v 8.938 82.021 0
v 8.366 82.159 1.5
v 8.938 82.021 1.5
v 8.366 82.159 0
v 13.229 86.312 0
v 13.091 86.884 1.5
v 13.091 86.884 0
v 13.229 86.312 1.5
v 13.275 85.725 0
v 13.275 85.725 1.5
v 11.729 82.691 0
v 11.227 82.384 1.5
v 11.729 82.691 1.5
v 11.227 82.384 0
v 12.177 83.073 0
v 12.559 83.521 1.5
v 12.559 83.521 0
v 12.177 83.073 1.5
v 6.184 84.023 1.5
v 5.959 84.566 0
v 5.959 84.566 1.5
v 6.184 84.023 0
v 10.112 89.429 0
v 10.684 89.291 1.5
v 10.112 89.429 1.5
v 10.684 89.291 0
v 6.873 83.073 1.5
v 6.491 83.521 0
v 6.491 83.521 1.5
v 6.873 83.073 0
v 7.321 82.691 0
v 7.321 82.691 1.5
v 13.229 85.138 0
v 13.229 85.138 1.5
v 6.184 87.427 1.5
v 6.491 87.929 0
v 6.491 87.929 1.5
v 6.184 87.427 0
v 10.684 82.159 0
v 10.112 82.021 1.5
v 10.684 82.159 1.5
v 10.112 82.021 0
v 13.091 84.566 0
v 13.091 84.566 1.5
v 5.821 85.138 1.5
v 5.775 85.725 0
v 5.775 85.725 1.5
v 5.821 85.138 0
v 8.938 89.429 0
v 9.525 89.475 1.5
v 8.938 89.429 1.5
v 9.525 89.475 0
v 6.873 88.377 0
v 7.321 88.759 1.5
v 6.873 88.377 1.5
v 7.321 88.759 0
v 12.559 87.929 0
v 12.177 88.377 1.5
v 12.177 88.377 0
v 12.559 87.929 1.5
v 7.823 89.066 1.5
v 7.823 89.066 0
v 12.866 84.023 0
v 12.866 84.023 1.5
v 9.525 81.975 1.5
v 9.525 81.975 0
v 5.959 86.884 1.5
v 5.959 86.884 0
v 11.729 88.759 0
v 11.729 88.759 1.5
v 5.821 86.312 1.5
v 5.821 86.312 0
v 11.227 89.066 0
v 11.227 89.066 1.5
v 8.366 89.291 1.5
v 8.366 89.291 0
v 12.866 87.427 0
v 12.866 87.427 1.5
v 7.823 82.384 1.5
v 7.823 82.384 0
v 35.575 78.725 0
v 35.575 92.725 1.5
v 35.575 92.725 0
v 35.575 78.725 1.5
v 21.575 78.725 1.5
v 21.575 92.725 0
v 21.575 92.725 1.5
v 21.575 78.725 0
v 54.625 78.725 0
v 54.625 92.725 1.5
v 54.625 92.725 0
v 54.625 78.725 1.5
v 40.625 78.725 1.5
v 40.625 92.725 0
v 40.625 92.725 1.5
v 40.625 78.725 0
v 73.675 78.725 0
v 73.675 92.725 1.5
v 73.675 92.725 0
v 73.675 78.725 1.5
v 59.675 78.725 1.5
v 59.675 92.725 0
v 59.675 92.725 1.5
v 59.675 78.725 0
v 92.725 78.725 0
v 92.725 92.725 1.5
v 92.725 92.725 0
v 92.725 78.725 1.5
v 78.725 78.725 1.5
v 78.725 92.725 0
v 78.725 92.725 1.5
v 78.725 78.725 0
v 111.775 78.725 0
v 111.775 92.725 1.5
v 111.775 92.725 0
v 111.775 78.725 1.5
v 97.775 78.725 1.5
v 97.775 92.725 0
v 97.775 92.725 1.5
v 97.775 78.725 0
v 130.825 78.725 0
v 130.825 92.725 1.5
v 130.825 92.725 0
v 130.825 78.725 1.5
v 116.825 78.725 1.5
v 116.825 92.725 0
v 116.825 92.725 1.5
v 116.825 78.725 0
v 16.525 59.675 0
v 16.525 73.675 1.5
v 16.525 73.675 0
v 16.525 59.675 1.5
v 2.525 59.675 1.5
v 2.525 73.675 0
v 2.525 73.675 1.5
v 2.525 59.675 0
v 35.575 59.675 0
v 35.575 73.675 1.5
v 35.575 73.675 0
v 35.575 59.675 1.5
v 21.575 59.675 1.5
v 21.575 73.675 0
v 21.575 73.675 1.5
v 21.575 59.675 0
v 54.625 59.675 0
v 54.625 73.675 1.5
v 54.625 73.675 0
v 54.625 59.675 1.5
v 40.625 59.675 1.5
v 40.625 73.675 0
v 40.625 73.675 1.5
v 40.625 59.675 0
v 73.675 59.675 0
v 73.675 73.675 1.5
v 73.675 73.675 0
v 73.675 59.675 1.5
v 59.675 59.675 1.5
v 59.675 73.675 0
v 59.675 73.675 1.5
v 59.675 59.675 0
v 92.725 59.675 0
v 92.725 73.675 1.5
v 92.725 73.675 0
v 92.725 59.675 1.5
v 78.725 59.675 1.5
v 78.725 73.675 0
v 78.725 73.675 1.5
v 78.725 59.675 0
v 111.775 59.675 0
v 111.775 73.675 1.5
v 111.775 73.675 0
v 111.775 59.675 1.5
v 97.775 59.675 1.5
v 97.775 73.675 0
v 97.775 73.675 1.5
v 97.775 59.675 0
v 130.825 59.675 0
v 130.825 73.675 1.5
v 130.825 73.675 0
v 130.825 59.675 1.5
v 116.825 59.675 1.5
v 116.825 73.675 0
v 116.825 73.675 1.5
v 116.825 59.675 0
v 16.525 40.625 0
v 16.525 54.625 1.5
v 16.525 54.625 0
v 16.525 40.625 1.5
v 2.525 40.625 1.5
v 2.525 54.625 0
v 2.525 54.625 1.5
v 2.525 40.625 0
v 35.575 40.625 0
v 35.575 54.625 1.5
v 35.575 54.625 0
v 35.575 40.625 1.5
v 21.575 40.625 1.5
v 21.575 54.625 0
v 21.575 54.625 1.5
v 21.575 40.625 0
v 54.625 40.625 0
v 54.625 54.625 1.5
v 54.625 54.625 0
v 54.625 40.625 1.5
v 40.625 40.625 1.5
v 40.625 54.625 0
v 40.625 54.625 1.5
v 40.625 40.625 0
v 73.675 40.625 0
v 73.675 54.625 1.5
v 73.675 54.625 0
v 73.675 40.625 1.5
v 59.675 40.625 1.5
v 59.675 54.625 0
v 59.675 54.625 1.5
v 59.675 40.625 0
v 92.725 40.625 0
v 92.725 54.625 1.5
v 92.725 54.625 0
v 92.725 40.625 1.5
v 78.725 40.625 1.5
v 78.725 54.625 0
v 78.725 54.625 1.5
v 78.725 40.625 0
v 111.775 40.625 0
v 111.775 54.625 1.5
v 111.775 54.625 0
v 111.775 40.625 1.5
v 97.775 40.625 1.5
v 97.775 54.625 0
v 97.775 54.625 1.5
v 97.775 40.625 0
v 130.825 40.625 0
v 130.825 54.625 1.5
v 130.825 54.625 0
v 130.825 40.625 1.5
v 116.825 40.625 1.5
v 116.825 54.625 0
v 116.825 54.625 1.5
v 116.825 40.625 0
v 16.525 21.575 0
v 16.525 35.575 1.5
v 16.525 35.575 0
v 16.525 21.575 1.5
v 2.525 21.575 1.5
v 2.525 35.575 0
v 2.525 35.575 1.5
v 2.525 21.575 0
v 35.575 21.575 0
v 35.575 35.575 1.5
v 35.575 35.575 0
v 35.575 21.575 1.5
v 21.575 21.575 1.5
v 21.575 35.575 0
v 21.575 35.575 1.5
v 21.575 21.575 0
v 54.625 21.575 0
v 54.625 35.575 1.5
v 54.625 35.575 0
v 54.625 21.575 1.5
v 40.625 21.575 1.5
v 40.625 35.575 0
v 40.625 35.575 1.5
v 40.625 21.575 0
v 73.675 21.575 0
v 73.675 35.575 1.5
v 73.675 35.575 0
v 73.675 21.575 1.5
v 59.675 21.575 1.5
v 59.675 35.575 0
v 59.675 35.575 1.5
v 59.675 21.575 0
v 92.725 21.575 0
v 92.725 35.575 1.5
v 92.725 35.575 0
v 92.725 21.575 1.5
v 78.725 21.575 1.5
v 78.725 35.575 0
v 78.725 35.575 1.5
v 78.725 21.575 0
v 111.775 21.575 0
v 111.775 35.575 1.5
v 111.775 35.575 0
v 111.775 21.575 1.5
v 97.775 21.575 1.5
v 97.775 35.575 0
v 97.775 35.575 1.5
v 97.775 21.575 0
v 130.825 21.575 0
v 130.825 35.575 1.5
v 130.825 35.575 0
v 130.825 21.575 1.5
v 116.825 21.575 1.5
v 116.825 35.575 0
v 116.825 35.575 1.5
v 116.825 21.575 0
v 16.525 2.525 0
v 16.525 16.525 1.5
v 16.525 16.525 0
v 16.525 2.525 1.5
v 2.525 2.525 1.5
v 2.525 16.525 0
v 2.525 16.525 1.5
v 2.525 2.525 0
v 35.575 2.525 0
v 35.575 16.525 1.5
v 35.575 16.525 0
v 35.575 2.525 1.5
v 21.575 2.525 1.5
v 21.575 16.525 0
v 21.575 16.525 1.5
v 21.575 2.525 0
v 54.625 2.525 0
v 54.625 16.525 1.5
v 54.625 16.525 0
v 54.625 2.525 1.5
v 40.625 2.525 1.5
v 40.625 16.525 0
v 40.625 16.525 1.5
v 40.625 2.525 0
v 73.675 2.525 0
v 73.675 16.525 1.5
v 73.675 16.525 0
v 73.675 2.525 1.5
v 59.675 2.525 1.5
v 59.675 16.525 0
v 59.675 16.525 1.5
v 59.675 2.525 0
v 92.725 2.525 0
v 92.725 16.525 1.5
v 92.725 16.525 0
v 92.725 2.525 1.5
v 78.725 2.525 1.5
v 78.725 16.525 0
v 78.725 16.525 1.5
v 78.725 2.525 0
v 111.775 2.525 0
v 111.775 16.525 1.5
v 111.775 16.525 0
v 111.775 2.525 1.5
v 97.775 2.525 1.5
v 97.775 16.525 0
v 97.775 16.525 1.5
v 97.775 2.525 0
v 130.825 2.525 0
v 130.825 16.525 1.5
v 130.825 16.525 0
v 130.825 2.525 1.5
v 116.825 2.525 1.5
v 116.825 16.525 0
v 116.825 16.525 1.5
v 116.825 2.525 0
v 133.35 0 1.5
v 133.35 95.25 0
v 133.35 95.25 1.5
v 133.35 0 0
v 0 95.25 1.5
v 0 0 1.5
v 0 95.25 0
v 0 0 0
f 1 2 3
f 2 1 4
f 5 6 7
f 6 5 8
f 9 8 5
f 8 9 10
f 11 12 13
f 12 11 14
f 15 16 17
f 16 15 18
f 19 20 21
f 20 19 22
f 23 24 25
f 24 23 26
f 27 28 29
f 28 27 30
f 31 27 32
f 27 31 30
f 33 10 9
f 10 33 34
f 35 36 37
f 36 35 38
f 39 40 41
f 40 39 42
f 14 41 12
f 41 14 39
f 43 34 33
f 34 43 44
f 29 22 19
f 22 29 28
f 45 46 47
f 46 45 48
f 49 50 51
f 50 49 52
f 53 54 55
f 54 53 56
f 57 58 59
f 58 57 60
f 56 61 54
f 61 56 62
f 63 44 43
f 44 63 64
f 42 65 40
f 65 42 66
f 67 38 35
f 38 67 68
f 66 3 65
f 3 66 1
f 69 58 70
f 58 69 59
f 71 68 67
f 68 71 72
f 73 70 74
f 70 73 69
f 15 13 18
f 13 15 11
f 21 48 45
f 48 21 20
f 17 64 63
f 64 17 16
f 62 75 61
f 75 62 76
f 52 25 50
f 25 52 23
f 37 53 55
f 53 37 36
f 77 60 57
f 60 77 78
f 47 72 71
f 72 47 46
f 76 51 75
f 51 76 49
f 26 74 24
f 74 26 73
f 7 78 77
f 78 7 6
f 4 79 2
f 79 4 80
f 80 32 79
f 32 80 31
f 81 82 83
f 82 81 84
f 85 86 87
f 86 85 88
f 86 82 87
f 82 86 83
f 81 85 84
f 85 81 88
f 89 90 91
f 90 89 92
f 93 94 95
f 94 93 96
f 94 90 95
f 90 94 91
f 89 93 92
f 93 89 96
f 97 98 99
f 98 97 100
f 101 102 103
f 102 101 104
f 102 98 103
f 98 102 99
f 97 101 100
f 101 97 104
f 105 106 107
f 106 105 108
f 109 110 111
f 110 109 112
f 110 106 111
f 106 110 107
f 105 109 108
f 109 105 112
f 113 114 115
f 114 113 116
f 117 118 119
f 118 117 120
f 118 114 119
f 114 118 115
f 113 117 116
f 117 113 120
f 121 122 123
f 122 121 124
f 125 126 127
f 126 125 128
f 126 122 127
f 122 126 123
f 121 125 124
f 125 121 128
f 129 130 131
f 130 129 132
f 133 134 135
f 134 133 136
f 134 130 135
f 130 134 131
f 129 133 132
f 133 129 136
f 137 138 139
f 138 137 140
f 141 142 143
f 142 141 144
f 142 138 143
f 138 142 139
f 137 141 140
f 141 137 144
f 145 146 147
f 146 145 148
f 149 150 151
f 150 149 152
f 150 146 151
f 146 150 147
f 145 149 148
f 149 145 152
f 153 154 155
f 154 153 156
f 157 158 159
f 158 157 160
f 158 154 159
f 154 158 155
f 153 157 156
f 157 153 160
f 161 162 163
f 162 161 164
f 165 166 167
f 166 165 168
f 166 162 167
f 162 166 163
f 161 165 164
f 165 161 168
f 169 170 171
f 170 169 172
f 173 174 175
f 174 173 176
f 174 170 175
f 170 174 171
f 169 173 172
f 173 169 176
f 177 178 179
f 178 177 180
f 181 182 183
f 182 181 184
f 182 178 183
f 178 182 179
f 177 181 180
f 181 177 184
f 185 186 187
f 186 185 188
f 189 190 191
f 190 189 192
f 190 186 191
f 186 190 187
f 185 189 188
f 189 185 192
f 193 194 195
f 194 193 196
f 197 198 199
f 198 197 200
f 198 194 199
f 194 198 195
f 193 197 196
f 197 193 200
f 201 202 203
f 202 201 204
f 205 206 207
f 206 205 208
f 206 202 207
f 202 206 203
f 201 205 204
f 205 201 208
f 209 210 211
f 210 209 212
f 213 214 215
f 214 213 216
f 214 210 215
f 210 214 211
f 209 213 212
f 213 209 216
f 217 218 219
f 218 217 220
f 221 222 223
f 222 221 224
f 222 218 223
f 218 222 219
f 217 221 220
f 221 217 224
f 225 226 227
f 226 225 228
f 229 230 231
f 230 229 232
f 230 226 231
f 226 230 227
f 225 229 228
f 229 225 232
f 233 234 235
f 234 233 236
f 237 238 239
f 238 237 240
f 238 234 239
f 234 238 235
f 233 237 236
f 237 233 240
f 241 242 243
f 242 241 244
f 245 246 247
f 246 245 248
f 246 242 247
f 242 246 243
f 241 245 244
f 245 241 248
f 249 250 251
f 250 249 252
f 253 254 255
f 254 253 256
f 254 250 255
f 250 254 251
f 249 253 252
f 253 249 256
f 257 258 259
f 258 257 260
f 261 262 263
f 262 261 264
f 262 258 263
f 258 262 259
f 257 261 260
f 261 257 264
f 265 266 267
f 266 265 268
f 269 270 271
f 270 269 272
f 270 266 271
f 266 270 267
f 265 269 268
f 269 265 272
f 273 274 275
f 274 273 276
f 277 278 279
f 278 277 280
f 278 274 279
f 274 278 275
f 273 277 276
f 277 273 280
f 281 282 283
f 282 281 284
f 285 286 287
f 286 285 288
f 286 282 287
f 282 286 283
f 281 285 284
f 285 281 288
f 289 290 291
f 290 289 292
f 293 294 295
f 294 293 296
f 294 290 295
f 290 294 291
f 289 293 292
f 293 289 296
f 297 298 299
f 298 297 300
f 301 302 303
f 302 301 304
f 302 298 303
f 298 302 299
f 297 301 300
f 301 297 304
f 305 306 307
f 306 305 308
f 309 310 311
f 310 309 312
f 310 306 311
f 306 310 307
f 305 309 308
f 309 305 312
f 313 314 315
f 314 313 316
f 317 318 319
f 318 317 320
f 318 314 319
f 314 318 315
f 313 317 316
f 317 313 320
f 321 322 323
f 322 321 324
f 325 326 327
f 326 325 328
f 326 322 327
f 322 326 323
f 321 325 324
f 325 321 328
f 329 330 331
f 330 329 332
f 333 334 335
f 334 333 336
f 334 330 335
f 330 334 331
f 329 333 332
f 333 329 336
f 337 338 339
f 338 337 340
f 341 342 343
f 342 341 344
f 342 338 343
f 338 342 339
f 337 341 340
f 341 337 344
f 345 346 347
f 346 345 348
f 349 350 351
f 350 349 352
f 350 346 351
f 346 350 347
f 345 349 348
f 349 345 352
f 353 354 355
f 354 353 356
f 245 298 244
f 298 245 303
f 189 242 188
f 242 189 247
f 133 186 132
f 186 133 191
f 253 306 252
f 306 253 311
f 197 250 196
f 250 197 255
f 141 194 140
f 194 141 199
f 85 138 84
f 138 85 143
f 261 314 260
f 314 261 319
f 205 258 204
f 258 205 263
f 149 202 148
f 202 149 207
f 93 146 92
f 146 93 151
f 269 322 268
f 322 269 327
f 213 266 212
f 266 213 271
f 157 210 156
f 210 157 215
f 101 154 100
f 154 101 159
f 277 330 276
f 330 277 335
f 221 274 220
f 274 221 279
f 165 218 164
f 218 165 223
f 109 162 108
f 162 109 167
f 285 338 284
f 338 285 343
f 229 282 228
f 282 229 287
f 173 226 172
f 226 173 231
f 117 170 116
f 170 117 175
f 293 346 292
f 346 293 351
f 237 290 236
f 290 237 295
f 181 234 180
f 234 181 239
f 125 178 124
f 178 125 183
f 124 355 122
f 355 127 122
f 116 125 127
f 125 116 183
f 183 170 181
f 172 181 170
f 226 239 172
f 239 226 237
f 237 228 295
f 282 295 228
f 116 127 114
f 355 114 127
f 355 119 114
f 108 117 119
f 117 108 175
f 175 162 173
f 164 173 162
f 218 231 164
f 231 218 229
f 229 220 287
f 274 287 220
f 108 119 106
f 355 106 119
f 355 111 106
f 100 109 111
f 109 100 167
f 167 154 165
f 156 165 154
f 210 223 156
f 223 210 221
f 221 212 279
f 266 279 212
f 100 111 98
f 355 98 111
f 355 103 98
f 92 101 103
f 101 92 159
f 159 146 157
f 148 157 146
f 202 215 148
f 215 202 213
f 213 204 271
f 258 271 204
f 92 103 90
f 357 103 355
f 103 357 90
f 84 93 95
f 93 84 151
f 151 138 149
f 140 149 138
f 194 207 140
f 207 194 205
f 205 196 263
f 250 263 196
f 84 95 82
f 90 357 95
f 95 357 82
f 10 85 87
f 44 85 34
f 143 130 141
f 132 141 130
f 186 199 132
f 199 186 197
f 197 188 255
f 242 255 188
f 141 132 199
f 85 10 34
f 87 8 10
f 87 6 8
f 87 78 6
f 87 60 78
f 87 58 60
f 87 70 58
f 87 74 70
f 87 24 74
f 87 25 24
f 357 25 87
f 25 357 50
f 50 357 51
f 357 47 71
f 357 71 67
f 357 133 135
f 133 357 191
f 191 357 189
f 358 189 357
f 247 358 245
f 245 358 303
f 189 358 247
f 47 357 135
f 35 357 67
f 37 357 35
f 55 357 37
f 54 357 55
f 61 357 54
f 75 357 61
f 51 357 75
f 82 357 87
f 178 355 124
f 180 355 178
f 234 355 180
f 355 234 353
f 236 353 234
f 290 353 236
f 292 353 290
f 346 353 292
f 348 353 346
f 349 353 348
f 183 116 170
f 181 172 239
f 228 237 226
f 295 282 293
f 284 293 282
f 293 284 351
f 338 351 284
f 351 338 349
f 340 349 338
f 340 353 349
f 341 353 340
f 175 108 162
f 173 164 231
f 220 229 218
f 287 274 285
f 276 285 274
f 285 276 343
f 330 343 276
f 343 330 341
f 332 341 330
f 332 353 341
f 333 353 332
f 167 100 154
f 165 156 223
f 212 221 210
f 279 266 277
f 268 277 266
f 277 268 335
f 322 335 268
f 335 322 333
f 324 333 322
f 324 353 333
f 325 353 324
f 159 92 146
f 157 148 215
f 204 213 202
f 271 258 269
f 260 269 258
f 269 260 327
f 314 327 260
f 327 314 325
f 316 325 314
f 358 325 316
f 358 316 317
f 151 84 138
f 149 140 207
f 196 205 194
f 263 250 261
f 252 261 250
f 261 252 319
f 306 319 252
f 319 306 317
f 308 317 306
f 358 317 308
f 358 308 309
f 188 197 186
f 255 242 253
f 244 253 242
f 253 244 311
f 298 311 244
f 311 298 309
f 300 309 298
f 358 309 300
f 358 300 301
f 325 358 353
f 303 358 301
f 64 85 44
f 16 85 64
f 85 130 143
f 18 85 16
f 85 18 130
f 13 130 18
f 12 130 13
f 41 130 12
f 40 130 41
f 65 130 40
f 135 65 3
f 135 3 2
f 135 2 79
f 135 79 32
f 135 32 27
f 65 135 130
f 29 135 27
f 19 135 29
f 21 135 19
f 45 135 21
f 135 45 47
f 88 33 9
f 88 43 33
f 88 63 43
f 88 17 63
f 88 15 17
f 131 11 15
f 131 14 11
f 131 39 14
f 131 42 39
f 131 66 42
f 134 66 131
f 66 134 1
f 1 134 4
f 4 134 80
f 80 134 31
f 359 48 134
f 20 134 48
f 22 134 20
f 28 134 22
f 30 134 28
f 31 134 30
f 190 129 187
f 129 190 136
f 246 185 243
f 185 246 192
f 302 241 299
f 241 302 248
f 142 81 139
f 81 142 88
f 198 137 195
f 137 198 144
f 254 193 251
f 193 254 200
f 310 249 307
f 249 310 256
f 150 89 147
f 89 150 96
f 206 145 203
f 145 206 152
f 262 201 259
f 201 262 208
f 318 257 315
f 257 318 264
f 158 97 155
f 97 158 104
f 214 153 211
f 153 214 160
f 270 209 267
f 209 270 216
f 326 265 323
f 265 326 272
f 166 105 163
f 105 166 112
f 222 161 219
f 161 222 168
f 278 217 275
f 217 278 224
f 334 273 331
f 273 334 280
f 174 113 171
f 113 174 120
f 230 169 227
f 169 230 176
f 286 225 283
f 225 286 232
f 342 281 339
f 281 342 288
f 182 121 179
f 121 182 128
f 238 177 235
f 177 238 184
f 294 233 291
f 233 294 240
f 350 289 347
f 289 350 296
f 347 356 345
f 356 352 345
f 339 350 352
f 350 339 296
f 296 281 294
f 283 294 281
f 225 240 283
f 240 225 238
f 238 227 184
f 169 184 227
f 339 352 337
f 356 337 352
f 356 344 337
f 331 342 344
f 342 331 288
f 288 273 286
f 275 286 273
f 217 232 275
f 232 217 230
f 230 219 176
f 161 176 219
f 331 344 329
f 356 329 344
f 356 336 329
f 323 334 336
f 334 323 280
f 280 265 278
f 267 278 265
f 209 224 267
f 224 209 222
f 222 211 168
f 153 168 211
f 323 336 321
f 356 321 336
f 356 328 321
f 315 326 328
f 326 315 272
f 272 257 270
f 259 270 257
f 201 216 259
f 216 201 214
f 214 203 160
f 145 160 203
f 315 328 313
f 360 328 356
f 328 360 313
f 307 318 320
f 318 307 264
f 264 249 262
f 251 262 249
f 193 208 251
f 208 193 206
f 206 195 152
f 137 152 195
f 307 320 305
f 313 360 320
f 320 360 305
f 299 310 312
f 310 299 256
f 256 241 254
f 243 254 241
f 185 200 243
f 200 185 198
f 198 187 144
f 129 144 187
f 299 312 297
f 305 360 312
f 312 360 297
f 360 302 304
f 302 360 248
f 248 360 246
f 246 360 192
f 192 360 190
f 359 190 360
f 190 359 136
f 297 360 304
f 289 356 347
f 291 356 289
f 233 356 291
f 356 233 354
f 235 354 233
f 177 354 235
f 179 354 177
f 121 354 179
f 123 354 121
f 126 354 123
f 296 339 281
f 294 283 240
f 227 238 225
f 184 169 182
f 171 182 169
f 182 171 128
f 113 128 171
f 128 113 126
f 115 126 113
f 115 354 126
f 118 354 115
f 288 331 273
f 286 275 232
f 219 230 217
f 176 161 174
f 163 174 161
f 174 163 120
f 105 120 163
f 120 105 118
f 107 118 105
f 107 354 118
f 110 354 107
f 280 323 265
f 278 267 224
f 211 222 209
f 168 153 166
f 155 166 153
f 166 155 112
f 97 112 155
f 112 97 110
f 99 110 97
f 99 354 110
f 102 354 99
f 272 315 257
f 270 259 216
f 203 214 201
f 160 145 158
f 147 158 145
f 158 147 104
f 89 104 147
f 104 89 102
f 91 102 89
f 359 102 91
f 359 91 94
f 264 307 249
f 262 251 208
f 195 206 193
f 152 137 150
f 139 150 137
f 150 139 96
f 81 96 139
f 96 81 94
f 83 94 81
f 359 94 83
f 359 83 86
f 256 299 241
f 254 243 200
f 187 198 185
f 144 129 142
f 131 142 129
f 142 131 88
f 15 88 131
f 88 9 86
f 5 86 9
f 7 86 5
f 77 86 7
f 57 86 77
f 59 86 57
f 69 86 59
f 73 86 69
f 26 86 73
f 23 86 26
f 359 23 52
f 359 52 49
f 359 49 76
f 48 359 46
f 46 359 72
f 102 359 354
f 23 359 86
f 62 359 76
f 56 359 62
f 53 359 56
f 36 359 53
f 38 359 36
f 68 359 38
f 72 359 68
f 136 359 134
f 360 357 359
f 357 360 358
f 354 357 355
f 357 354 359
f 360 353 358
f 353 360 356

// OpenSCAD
// file: interlock_params.scad
/*
 * Interlock Ergo - Shared Parametric Definitions
 * Supports both Kailh Choc v1 (crkbd/corne style) and Cherry MX standards.
 */

// Global OpenSCAD rendering resolution
$fn = 40;

// Interlocking mechanical tolerances
interlock_tol = 0.20;     // 0.2mm sliding joint clearance
magnet_d = 6.2;           // Pocket for 6mm disc magnet
magnet_h = 3.2;           // Pocket depth for 3mm magnet
fillet_r = 3.0;           // Outer chassis corner radius
wall_thickness = 3.5;     // Exterior perimeter wall

// Switch Standards
// Choc v1 (Corne/crkbd standard): 18.0mm X pitch, 17.0mm Y pitch, 1.2mm plate thickness
choc_pitch_x = 18.0;
choc_pitch_y = 17.0;
choc_switch_cutout = 13.8;
choc_plate_thickness = 1.2;
choc_case_depth = 9.5;    // Low profile depth

// MX Standard: 19.05mm X pitch, 19.05mm Y pitch, 1.5mm plate thickness
mx_pitch_x = 19.05;
mx_pitch_y = 19.05;
mx_switch_cutout = 14.0;
mx_plate_thickness = 1.5;
mx_case_depth = 12.5;     // Standard MX depth

// Common utility: Rounded box
module rounded_box(w, l, h, r) {
    hull() {
        translate([r, r, 0]) cylinder(r = r, h = h);
        translate([w - r, r, 0]) cylinder(r = r, h = h);
        translate([w - r, l - r, 0]) cylinder(r = r, h = h);
        translate([r, l - r, 0]) cylinder(r = r, h = h);
    }
}

// Interlocking male dovetail tab
module dovetail_male(depth) {
    linear_extrude(height = depth - 2) {
        polygon(points = [
            [0, -6],
            [5.5, -4],
            [5.5, 4],
            [0, 6]
        ]);
    }
}

// Interlocking female dovetail socket
module dovetail_female(depth) {
    linear_extrude(height = depth) {
        polygon(points = [
            [-0.1, -6 - interlock_tol],
            [5.5 + interlock_tol, -4 - interlock_tol],
            [5.5 + interlock_tol, 4 + interlock_tol],
            [-0.1, 6 + interlock_tol]
        ]);
    }
}

// Magnet pocket
module magnet_cavity() {
    cylinder(d = magnet_d, h = magnet_h, center = true);
}
// main file
/*
 * Interlock Ergo Switch Plate - Cherry MX Standard Profile
 * Plate thickness: 1.5mm
 * Switch cutouts: 14.0mm x 14.0mm with 19.05mm X x 19.05mm Y pitch
 */

include <interlock_params.scad>

cols_left = 7;
cols_right = 9;
rows = 5;

plate_w_left = cols_left * mx_pitch_x;
plate_l_left = rows * mx_pitch_y;

plate_w_right = cols_right * mx_pitch_x;
plate_l_right = rows * mx_pitch_y;

module mx_plate_left() {
    difference() {
        cube([plate_w_left, plate_l_left, mx_plate_thickness]);

        for (r = [0 : rows - 1]) {
            for (c = [0 : cols_left - 1]) {
                if (r == 0 && c == 0) {
                    translate([c * mx_pitch_x + mx_pitch_x * 0.5, (rows - 1 - r) * mx_pitch_y + mx_pitch_y * 0.5, -1])
                        cylinder(d = 7.5, h = mx_plate_thickness + 2);
                } else {
                    translate([c * mx_pitch_x + (mx_pitch_x - mx_switch_cutout) * 0.5,
                               (rows - 1 - r) * mx_pitch_y + (mx_pitch_y - mx_switch_cutout) * 0.5,
                               -1])
                        cube([mx_switch_cutout, mx_switch_cutout, mx_plate_thickness + 2]);
                }
            }
        }
    }
}

module mx_plate_right() {
    difference() {
        cube([plate_w_right, plate_l_right, mx_plate_thickness]);

        for (r = [0 : rows - 1]) {
            for (c = [0 : cols_right - 1]) {
                translate([c * mx_pitch_x + (mx_pitch_x - mx_switch_cutout) * 0.5,
                           (rows - 1 - r) * mx_pitch_y + (mx_pitch_y - mx_switch_cutout) * 0.5,
                           -1])
                    cube([mx_switch_cutout, mx_switch_cutout, mx_plate_thickness + 2]);
            }
        }
    }
}

mode = "left";

if (mode == "left") {
    mx_plate_left();
} else {
    mx_plate_right();
}
